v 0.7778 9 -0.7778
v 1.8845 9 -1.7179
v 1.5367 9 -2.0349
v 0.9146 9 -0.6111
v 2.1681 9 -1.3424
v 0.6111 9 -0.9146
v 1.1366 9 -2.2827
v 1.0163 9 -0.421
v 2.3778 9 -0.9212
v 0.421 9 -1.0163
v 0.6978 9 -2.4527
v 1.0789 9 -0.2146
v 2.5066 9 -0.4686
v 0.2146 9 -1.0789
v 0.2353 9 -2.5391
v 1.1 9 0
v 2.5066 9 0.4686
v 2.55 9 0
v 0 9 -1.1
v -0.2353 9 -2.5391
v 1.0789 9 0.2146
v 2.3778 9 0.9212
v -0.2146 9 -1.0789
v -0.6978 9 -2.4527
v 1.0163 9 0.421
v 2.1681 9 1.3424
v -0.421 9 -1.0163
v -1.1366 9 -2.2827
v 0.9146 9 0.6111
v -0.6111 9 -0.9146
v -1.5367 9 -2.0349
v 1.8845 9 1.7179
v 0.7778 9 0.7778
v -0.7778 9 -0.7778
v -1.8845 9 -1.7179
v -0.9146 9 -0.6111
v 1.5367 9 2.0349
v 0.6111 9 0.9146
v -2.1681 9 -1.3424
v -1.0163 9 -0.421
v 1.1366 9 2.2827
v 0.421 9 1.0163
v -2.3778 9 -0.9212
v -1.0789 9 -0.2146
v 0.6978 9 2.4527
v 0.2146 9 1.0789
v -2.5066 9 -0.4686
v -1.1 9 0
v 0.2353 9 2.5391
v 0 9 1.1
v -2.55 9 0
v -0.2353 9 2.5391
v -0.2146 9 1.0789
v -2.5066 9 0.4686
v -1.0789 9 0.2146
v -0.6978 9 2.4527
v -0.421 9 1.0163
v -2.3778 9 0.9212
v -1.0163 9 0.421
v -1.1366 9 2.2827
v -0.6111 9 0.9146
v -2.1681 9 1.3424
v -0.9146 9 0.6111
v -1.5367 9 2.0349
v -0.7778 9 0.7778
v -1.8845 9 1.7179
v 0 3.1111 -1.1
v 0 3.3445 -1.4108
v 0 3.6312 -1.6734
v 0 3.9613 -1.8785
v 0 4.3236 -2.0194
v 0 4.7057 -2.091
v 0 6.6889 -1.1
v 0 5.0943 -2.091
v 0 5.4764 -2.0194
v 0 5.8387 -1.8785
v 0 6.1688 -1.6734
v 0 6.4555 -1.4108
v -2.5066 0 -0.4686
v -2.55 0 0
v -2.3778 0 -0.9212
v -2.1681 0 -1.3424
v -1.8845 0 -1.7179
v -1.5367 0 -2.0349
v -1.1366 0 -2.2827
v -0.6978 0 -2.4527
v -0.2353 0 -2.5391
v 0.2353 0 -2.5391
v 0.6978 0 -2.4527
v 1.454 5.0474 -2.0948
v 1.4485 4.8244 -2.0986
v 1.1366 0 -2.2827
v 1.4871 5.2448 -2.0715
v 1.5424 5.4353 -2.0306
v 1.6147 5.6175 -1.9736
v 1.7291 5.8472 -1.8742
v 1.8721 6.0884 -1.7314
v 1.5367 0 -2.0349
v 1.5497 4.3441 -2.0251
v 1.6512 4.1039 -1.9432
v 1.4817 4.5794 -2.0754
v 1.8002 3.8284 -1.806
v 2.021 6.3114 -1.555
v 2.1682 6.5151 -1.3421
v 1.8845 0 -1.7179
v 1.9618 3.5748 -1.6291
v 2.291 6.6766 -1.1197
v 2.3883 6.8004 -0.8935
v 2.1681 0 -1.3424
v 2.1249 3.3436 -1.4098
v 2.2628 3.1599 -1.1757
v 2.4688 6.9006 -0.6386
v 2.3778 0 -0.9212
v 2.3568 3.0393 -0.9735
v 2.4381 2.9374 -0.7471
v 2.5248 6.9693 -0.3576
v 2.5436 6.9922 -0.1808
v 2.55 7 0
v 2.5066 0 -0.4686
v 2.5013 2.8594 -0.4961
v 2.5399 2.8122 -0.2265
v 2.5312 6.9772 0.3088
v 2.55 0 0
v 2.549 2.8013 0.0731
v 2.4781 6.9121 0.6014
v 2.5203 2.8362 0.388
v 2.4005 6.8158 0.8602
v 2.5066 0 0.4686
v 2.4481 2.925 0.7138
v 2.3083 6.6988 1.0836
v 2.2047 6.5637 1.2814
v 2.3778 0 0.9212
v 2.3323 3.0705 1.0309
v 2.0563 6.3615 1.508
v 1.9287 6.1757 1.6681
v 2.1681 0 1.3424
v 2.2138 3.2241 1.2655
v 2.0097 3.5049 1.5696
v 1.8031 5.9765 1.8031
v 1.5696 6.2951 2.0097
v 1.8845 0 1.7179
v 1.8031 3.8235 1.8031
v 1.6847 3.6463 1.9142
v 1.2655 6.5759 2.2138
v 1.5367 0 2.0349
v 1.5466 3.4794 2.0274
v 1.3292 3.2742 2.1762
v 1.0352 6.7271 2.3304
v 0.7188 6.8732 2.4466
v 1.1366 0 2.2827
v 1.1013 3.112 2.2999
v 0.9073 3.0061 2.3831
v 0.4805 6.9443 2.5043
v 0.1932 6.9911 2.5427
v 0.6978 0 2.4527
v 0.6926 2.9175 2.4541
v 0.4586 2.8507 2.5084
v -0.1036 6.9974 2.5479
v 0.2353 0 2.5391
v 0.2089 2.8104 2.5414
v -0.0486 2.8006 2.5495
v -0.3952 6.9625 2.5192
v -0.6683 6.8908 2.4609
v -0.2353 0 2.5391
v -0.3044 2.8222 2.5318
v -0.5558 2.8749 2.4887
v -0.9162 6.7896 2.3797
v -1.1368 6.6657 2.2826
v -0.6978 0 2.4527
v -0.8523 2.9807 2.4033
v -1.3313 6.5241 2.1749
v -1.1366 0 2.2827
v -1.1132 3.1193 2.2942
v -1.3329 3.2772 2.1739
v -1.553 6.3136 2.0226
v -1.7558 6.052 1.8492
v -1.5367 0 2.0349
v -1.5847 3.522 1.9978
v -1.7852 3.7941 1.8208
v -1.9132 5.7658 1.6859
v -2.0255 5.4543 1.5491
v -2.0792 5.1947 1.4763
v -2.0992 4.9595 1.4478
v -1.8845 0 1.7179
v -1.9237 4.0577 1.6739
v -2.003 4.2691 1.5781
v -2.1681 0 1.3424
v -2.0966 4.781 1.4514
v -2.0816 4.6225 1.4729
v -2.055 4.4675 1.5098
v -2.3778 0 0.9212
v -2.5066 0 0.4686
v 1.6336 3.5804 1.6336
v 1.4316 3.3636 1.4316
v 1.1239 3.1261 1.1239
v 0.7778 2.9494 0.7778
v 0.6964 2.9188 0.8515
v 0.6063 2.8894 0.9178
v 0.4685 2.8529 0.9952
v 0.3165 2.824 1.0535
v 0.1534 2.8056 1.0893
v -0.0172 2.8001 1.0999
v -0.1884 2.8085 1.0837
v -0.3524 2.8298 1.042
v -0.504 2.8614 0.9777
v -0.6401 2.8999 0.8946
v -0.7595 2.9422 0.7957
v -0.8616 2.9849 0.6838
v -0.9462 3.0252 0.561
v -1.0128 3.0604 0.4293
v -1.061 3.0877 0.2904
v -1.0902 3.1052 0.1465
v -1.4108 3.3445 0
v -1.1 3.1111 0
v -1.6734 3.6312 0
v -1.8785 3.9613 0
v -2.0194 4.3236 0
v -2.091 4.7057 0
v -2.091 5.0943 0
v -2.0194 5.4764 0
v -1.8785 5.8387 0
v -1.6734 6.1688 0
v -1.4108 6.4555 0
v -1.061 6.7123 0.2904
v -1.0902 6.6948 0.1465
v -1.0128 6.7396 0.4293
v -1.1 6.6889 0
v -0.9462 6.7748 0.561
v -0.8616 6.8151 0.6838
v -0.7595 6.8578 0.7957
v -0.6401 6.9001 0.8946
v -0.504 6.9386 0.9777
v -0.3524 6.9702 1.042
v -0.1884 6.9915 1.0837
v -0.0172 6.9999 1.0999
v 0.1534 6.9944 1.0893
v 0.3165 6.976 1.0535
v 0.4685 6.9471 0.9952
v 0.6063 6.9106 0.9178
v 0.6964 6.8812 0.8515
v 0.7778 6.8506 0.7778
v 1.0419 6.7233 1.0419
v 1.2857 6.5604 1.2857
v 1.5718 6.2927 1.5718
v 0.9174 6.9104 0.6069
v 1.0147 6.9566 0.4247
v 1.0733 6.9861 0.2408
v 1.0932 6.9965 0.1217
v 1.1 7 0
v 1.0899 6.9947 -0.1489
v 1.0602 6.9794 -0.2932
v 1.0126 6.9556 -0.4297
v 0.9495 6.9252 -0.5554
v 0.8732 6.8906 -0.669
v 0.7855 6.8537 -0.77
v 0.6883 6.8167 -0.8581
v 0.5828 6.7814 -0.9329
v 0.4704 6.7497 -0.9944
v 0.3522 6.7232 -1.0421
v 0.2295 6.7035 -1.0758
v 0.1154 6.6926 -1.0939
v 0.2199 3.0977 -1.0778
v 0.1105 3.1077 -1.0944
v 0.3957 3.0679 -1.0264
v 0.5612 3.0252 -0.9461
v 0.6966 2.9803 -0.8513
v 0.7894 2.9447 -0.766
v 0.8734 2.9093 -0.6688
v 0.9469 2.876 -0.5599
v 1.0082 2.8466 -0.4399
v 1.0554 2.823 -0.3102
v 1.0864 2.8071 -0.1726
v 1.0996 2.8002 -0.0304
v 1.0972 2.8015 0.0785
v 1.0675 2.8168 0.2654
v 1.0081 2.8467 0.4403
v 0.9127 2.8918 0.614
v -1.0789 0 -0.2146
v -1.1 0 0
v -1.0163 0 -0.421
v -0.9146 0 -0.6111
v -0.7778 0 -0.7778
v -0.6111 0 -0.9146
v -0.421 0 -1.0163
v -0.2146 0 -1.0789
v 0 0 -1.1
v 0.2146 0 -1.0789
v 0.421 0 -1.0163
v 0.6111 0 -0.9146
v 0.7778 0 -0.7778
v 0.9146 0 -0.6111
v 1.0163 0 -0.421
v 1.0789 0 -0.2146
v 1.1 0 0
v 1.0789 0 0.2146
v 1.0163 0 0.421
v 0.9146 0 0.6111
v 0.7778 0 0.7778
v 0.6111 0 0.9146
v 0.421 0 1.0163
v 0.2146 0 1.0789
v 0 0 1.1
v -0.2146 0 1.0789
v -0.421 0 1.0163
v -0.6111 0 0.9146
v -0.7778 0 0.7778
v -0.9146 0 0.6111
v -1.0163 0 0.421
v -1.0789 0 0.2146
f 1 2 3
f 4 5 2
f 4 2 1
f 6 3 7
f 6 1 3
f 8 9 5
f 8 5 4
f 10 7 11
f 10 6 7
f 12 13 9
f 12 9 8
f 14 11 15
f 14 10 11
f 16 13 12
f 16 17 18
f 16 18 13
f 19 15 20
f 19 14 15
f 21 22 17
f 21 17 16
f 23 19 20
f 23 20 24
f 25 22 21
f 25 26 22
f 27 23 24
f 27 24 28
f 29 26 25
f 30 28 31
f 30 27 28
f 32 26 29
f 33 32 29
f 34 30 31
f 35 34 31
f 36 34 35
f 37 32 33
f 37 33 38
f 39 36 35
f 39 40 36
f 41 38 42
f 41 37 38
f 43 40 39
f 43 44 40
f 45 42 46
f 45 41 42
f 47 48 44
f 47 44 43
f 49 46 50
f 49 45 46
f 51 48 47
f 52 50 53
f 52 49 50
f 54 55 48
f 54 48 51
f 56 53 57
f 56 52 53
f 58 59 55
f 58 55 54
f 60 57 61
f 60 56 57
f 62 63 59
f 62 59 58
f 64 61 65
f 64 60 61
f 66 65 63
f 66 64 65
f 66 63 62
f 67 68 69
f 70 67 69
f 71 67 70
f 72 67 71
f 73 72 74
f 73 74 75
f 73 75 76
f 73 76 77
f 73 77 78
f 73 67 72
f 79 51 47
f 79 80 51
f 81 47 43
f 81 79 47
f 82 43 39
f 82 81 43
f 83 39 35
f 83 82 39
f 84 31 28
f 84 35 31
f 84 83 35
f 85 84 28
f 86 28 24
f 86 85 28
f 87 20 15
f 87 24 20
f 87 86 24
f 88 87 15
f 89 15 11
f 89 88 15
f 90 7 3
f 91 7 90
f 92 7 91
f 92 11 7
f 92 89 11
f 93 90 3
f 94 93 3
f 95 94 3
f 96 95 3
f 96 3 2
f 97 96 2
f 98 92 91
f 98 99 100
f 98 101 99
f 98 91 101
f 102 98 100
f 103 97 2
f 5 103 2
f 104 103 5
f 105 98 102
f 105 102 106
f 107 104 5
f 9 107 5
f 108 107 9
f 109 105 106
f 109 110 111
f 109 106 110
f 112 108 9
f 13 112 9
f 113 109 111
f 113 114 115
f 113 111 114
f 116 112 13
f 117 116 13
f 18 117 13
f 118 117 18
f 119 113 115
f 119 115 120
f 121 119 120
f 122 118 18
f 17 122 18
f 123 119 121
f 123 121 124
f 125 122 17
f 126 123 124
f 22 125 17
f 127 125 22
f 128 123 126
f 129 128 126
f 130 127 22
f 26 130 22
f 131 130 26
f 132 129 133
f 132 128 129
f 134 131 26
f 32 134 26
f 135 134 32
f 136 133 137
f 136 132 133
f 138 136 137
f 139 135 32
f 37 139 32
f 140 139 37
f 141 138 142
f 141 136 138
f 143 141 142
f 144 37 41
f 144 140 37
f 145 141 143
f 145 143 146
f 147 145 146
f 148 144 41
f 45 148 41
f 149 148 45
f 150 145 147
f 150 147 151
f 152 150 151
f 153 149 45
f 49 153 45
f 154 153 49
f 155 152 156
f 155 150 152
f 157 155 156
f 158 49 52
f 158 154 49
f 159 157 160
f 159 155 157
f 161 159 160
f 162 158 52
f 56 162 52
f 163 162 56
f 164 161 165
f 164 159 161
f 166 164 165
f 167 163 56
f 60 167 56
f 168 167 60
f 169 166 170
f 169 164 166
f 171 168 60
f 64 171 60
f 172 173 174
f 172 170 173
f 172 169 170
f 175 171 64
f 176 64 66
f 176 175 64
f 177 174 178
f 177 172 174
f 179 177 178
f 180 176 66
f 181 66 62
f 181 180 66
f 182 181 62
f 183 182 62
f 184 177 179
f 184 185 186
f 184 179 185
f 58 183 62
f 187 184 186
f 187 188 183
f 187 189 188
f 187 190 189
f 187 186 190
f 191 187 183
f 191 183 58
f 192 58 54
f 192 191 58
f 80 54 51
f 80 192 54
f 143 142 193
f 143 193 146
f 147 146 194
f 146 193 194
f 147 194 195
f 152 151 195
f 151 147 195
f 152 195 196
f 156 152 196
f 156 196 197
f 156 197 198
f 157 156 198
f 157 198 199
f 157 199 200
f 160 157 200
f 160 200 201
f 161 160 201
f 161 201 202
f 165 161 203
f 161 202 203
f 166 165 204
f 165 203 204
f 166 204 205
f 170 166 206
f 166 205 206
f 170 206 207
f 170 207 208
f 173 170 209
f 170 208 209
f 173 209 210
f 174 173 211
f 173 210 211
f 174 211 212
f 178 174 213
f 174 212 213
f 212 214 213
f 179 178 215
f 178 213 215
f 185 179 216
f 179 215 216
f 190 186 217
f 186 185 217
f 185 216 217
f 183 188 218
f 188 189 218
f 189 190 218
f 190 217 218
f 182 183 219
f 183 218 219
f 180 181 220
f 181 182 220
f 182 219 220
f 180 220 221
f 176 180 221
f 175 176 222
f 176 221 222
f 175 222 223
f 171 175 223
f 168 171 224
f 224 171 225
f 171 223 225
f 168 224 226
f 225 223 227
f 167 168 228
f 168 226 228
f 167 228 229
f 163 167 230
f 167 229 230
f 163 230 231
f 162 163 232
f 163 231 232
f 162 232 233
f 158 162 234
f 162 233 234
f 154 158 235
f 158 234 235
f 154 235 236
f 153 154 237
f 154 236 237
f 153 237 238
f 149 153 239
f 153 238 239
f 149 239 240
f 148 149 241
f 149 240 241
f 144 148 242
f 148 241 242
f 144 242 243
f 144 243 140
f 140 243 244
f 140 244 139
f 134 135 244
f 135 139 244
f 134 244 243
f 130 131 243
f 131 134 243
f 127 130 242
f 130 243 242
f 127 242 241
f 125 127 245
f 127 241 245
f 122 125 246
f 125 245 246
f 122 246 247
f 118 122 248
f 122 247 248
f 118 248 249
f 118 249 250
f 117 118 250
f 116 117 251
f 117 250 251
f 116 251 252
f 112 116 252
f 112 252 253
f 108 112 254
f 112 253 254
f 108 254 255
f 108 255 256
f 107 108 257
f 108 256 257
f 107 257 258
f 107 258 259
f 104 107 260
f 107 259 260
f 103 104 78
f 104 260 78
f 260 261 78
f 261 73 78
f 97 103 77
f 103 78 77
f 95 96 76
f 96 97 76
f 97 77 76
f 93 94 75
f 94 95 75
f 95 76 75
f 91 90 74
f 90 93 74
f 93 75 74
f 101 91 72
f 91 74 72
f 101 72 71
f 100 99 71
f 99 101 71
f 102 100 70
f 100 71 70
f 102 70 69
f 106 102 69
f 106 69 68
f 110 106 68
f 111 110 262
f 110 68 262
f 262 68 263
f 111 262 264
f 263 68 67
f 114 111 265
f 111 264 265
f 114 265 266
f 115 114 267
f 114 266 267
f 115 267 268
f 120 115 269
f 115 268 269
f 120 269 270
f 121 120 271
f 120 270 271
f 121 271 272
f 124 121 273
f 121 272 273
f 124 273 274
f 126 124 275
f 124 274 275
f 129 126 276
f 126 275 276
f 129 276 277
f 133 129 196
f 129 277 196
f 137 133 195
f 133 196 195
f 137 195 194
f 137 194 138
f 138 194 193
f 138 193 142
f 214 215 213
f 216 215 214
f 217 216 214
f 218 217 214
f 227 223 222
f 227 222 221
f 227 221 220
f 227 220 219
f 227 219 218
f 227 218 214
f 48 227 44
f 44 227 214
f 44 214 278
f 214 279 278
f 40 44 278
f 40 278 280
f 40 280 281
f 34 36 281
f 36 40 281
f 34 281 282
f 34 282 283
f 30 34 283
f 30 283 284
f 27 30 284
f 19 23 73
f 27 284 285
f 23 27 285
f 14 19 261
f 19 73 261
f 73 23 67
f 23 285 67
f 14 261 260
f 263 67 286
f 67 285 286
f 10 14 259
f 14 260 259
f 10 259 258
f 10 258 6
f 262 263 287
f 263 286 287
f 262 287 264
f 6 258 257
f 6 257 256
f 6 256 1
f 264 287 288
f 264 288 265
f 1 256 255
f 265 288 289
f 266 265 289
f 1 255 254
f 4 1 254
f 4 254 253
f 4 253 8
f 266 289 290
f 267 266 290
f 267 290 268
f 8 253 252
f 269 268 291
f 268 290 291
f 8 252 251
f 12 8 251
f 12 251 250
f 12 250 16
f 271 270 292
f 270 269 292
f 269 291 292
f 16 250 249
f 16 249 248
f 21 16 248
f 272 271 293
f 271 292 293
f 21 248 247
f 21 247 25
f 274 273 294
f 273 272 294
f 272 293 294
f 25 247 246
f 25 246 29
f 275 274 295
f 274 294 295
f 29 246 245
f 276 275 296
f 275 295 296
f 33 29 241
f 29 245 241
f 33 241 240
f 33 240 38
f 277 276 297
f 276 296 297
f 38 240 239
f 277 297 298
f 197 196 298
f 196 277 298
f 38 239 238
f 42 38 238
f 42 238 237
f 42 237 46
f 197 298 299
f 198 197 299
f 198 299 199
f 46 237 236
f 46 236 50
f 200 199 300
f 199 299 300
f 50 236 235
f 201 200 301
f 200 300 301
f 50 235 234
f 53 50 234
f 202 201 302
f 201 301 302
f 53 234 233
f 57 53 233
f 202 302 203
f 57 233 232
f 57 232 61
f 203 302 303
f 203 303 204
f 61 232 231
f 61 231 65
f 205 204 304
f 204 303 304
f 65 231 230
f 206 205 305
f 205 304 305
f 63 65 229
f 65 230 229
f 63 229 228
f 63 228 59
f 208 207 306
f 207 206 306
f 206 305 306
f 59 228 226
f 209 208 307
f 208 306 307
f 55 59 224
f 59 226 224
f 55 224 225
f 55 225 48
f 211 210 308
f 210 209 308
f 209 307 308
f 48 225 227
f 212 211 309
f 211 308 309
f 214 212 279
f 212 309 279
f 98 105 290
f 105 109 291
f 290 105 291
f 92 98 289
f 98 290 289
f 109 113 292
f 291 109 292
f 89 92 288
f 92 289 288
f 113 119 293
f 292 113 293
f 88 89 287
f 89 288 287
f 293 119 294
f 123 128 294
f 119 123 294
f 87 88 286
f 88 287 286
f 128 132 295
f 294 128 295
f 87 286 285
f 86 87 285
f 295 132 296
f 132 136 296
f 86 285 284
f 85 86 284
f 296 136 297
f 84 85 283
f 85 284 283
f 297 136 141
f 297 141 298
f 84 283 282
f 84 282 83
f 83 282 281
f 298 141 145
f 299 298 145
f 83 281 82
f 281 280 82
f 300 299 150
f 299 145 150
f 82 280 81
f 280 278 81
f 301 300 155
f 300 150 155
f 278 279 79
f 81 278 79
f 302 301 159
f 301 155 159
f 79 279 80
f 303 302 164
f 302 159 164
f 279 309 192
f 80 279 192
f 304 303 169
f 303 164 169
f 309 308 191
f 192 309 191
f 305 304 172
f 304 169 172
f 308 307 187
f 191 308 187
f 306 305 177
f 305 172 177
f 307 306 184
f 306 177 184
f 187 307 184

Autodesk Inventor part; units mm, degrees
ref_plane "YZ Plane" through (0, 0, 0) normal (1, 0, 0) x (0, 1, 0)
ref_plane "XZ Plane" through (0, 0, 0) normal (0, 1, 0) x (-1, 0, 0)
ref_plane "XY Plane" through (0, 0, 0) normal (0, 0, 1) x (1, 0, 0)
sketch "Sketch1" plane through (0, 0, 0) normal (0, 1, 0) x (-1, 0, 0)
  circle A0 centre (0, 0) radius 1.1
  circle A1 centre (0, 0) radius 2.55
  dimension "d0" = 2.2
  dimension "d1" = 5.1
extrude "Extrusion1" add sketch "Sketch1" along normal blind 9
sketch "Sketch2" plane through (0, 0, 0) normal (0, 0, 1) x (1, 0, 0)
  line L0 (2.55, 9) -> (-2.55, 9) projected
  line L1 (2.55, 0) -> (-2.55, 0) projected
  line L2 (-2.55, 0) -> (-2.55, 9) projected
  line L3 (-2.55, 7) -> (2.5173, 7)
  line L4 (2.55, 9) -> (-2.55, 9) projected
  line L5 (0, 9) -> (0, 0)
  circle A0 centre (0, 4.9) radius 2.1
  dimension "d4" = 2
  dimension "d5" = 4.2
extrude "Extrusion2" cut sketch "Sketch2" along normal blind 12 contours A0 L5 | L5 A0
sketch "Sketch3" plane through (0, 0, 0) normal (1, 0, 0) x (0, 1, 0)
  line L0 (9, -2.55) -> (9, 2.55) projected
  line L1 (0, -2.55) -> (0, 2.55) projected
  line L2 (0, 2.55) -> (9, 2.55) projected
  line L3 (7, 2.55) -> (7, -2.525)
  line L4 (9, 1.1) -> (9, -1.1) projected
  line L5 (9, 0) -> (0, 0)
  circle A0 centre (4.9, 0) radius 2.1
  point P0 (4.9, 1.4465)
  dimension "d8" = 2
  dimension "d9" = 4.2
extrude "Extrusion3" cut sketch "Sketch3" along normal up to next contours A0 L5 | L5 A0
properties part number "motor_shaft_adapter" material "ABS Plastic"
